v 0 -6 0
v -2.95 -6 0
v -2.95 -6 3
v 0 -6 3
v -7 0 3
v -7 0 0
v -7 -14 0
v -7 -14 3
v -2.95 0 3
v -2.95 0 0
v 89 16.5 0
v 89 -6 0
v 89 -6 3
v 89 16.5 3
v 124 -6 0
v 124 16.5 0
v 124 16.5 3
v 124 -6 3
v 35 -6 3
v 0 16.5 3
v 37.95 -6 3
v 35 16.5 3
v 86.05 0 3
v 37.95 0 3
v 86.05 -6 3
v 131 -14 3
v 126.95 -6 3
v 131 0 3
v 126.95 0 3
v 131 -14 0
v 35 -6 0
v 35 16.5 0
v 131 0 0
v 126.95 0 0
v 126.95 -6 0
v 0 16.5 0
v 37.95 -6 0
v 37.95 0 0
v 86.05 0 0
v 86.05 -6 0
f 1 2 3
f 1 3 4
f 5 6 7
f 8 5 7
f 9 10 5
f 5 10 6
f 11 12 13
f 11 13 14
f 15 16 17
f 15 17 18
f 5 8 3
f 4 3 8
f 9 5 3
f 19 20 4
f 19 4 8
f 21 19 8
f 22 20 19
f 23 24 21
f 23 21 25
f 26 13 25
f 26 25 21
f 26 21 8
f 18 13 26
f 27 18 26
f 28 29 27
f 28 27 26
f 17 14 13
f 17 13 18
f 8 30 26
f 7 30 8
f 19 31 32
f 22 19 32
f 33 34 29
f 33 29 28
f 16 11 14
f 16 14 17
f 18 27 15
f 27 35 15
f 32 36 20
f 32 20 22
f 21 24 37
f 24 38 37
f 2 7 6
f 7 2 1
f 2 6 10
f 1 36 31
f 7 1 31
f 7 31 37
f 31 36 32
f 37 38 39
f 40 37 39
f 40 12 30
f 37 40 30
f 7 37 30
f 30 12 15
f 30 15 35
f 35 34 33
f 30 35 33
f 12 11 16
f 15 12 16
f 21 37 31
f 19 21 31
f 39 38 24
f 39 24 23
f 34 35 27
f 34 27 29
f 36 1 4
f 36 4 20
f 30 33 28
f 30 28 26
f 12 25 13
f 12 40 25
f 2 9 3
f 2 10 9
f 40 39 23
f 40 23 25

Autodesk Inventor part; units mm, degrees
ref_plane "YZ Plane" through (0, 0, 0) normal (1, 0, 0) x (0, 1, 0)
ref_plane "XZ Plane" through (0, 0, 0) normal (0, 1, 0) x (-1, 0, 0)
ref_plane "XY Plane" through (0, 0, 0) normal (0, 0, 1) x (1, 0, 0)
sketch "草圖1" plane through (0, 0, 0) normal (0, 0, 1) x (1, 0, 0)
  line L0 (0, 0) -> (124, 0)
  line L1 (124, 0) -> (124, -14) construction
  line L2 (124, -14) -> (0, -14)
  line L3 (0, -14) -> (0, 0) construction
  line L4 (35, 0) -> (37.95, 0)
  line L5 (37.95, 0) -> (37.95, -6)
  line L6 (37.95, -6) -> (35, -6)
  line L7 (35, -6) -> (35, 0)
  line L8 (89, 0) -> (86.05, 0)
  line L9 (86.05, 0) -> (86.05, -6)
  line L10 (86.05, -6) -> (89, -6)
  line L11 (89, -6) -> (89, 0)
  line L12 (131, -14) -> (126.95, -14)
  line L13 (124, 0) -> (131, 0)
  line L14 (131, 0) -> (131, -14)
  line L15 (126.95, -14) -> (126.95, -6)
  line L16 (126.95, -6) -> (124, -6)
  line L17 (0, 0) -> (-7, 0)
  line L18 (-7, 0) -> (-7, -14)
  line L19 (-7, -14) -> (-2.95, -14)
  line L20 (0, -14) -> (0, 0) construction
  line L21 (-2.95, -14) -> (-2.95, -6)
  line L22 (-2.95, -6) -> (0, -6)
  line L23 (0, -6) -> (0, -14)
  line L24 (124, -6) -> (124, -14)
  line L25 (124, -14) -> (126.95, -14)
  line L26 (124, -6) -> (126.95, -6)
  line L27 (126.95, -6) -> (126.95, 0)
  line L28 (126.95, 0) -> (124, 0)
  line L29 (124, 0) -> (124, -6)
  line L30 (-2.95, -14) -> (0, -14)
  line L31 (-2.95, -6) -> (0, -6)
  line L32 (0, -6) -> (0, 0)
  line L33 (0, 0) -> (-2.95, 0)
  line L34 (-2.95, 0) -> (-2.95, -6)
  point P0 (0, -15.5)
  point P1 (0, -6)
  point P2 (0, -14)
  dimension "d0" = 124
  dimension "d1" = 35
  dimension "d3" = 2.95
  dimension "d4" = 2.95
  dimension "d10" = 8
  dimension "d16" = 6
  dimension "d17" = 35
  dimension "d18" = 2.95
  dimension "d21" = 7
  dimension "d22" = 2.95
  dimension "d24" = 7
  dimension "d29" = 6
  dimension "d30" = 6
extrude "擠出1" add sketch "草圖1" along normal blind 3 contours L0 L7 L6 L5 L9 L10 L11 L29 L24 L2 L23 L32 | L34 L21 L19 L18 L17 | L23 L30 L21 L22 | L24 L16 L15 L25 | L15 L27 L13 L14 L12
move faces "移動2" translate (0, 16.5, 0) faces at (23.3333, 0, 1) (112.3333, 0, 1)
properties part number "chassis_1_7"
